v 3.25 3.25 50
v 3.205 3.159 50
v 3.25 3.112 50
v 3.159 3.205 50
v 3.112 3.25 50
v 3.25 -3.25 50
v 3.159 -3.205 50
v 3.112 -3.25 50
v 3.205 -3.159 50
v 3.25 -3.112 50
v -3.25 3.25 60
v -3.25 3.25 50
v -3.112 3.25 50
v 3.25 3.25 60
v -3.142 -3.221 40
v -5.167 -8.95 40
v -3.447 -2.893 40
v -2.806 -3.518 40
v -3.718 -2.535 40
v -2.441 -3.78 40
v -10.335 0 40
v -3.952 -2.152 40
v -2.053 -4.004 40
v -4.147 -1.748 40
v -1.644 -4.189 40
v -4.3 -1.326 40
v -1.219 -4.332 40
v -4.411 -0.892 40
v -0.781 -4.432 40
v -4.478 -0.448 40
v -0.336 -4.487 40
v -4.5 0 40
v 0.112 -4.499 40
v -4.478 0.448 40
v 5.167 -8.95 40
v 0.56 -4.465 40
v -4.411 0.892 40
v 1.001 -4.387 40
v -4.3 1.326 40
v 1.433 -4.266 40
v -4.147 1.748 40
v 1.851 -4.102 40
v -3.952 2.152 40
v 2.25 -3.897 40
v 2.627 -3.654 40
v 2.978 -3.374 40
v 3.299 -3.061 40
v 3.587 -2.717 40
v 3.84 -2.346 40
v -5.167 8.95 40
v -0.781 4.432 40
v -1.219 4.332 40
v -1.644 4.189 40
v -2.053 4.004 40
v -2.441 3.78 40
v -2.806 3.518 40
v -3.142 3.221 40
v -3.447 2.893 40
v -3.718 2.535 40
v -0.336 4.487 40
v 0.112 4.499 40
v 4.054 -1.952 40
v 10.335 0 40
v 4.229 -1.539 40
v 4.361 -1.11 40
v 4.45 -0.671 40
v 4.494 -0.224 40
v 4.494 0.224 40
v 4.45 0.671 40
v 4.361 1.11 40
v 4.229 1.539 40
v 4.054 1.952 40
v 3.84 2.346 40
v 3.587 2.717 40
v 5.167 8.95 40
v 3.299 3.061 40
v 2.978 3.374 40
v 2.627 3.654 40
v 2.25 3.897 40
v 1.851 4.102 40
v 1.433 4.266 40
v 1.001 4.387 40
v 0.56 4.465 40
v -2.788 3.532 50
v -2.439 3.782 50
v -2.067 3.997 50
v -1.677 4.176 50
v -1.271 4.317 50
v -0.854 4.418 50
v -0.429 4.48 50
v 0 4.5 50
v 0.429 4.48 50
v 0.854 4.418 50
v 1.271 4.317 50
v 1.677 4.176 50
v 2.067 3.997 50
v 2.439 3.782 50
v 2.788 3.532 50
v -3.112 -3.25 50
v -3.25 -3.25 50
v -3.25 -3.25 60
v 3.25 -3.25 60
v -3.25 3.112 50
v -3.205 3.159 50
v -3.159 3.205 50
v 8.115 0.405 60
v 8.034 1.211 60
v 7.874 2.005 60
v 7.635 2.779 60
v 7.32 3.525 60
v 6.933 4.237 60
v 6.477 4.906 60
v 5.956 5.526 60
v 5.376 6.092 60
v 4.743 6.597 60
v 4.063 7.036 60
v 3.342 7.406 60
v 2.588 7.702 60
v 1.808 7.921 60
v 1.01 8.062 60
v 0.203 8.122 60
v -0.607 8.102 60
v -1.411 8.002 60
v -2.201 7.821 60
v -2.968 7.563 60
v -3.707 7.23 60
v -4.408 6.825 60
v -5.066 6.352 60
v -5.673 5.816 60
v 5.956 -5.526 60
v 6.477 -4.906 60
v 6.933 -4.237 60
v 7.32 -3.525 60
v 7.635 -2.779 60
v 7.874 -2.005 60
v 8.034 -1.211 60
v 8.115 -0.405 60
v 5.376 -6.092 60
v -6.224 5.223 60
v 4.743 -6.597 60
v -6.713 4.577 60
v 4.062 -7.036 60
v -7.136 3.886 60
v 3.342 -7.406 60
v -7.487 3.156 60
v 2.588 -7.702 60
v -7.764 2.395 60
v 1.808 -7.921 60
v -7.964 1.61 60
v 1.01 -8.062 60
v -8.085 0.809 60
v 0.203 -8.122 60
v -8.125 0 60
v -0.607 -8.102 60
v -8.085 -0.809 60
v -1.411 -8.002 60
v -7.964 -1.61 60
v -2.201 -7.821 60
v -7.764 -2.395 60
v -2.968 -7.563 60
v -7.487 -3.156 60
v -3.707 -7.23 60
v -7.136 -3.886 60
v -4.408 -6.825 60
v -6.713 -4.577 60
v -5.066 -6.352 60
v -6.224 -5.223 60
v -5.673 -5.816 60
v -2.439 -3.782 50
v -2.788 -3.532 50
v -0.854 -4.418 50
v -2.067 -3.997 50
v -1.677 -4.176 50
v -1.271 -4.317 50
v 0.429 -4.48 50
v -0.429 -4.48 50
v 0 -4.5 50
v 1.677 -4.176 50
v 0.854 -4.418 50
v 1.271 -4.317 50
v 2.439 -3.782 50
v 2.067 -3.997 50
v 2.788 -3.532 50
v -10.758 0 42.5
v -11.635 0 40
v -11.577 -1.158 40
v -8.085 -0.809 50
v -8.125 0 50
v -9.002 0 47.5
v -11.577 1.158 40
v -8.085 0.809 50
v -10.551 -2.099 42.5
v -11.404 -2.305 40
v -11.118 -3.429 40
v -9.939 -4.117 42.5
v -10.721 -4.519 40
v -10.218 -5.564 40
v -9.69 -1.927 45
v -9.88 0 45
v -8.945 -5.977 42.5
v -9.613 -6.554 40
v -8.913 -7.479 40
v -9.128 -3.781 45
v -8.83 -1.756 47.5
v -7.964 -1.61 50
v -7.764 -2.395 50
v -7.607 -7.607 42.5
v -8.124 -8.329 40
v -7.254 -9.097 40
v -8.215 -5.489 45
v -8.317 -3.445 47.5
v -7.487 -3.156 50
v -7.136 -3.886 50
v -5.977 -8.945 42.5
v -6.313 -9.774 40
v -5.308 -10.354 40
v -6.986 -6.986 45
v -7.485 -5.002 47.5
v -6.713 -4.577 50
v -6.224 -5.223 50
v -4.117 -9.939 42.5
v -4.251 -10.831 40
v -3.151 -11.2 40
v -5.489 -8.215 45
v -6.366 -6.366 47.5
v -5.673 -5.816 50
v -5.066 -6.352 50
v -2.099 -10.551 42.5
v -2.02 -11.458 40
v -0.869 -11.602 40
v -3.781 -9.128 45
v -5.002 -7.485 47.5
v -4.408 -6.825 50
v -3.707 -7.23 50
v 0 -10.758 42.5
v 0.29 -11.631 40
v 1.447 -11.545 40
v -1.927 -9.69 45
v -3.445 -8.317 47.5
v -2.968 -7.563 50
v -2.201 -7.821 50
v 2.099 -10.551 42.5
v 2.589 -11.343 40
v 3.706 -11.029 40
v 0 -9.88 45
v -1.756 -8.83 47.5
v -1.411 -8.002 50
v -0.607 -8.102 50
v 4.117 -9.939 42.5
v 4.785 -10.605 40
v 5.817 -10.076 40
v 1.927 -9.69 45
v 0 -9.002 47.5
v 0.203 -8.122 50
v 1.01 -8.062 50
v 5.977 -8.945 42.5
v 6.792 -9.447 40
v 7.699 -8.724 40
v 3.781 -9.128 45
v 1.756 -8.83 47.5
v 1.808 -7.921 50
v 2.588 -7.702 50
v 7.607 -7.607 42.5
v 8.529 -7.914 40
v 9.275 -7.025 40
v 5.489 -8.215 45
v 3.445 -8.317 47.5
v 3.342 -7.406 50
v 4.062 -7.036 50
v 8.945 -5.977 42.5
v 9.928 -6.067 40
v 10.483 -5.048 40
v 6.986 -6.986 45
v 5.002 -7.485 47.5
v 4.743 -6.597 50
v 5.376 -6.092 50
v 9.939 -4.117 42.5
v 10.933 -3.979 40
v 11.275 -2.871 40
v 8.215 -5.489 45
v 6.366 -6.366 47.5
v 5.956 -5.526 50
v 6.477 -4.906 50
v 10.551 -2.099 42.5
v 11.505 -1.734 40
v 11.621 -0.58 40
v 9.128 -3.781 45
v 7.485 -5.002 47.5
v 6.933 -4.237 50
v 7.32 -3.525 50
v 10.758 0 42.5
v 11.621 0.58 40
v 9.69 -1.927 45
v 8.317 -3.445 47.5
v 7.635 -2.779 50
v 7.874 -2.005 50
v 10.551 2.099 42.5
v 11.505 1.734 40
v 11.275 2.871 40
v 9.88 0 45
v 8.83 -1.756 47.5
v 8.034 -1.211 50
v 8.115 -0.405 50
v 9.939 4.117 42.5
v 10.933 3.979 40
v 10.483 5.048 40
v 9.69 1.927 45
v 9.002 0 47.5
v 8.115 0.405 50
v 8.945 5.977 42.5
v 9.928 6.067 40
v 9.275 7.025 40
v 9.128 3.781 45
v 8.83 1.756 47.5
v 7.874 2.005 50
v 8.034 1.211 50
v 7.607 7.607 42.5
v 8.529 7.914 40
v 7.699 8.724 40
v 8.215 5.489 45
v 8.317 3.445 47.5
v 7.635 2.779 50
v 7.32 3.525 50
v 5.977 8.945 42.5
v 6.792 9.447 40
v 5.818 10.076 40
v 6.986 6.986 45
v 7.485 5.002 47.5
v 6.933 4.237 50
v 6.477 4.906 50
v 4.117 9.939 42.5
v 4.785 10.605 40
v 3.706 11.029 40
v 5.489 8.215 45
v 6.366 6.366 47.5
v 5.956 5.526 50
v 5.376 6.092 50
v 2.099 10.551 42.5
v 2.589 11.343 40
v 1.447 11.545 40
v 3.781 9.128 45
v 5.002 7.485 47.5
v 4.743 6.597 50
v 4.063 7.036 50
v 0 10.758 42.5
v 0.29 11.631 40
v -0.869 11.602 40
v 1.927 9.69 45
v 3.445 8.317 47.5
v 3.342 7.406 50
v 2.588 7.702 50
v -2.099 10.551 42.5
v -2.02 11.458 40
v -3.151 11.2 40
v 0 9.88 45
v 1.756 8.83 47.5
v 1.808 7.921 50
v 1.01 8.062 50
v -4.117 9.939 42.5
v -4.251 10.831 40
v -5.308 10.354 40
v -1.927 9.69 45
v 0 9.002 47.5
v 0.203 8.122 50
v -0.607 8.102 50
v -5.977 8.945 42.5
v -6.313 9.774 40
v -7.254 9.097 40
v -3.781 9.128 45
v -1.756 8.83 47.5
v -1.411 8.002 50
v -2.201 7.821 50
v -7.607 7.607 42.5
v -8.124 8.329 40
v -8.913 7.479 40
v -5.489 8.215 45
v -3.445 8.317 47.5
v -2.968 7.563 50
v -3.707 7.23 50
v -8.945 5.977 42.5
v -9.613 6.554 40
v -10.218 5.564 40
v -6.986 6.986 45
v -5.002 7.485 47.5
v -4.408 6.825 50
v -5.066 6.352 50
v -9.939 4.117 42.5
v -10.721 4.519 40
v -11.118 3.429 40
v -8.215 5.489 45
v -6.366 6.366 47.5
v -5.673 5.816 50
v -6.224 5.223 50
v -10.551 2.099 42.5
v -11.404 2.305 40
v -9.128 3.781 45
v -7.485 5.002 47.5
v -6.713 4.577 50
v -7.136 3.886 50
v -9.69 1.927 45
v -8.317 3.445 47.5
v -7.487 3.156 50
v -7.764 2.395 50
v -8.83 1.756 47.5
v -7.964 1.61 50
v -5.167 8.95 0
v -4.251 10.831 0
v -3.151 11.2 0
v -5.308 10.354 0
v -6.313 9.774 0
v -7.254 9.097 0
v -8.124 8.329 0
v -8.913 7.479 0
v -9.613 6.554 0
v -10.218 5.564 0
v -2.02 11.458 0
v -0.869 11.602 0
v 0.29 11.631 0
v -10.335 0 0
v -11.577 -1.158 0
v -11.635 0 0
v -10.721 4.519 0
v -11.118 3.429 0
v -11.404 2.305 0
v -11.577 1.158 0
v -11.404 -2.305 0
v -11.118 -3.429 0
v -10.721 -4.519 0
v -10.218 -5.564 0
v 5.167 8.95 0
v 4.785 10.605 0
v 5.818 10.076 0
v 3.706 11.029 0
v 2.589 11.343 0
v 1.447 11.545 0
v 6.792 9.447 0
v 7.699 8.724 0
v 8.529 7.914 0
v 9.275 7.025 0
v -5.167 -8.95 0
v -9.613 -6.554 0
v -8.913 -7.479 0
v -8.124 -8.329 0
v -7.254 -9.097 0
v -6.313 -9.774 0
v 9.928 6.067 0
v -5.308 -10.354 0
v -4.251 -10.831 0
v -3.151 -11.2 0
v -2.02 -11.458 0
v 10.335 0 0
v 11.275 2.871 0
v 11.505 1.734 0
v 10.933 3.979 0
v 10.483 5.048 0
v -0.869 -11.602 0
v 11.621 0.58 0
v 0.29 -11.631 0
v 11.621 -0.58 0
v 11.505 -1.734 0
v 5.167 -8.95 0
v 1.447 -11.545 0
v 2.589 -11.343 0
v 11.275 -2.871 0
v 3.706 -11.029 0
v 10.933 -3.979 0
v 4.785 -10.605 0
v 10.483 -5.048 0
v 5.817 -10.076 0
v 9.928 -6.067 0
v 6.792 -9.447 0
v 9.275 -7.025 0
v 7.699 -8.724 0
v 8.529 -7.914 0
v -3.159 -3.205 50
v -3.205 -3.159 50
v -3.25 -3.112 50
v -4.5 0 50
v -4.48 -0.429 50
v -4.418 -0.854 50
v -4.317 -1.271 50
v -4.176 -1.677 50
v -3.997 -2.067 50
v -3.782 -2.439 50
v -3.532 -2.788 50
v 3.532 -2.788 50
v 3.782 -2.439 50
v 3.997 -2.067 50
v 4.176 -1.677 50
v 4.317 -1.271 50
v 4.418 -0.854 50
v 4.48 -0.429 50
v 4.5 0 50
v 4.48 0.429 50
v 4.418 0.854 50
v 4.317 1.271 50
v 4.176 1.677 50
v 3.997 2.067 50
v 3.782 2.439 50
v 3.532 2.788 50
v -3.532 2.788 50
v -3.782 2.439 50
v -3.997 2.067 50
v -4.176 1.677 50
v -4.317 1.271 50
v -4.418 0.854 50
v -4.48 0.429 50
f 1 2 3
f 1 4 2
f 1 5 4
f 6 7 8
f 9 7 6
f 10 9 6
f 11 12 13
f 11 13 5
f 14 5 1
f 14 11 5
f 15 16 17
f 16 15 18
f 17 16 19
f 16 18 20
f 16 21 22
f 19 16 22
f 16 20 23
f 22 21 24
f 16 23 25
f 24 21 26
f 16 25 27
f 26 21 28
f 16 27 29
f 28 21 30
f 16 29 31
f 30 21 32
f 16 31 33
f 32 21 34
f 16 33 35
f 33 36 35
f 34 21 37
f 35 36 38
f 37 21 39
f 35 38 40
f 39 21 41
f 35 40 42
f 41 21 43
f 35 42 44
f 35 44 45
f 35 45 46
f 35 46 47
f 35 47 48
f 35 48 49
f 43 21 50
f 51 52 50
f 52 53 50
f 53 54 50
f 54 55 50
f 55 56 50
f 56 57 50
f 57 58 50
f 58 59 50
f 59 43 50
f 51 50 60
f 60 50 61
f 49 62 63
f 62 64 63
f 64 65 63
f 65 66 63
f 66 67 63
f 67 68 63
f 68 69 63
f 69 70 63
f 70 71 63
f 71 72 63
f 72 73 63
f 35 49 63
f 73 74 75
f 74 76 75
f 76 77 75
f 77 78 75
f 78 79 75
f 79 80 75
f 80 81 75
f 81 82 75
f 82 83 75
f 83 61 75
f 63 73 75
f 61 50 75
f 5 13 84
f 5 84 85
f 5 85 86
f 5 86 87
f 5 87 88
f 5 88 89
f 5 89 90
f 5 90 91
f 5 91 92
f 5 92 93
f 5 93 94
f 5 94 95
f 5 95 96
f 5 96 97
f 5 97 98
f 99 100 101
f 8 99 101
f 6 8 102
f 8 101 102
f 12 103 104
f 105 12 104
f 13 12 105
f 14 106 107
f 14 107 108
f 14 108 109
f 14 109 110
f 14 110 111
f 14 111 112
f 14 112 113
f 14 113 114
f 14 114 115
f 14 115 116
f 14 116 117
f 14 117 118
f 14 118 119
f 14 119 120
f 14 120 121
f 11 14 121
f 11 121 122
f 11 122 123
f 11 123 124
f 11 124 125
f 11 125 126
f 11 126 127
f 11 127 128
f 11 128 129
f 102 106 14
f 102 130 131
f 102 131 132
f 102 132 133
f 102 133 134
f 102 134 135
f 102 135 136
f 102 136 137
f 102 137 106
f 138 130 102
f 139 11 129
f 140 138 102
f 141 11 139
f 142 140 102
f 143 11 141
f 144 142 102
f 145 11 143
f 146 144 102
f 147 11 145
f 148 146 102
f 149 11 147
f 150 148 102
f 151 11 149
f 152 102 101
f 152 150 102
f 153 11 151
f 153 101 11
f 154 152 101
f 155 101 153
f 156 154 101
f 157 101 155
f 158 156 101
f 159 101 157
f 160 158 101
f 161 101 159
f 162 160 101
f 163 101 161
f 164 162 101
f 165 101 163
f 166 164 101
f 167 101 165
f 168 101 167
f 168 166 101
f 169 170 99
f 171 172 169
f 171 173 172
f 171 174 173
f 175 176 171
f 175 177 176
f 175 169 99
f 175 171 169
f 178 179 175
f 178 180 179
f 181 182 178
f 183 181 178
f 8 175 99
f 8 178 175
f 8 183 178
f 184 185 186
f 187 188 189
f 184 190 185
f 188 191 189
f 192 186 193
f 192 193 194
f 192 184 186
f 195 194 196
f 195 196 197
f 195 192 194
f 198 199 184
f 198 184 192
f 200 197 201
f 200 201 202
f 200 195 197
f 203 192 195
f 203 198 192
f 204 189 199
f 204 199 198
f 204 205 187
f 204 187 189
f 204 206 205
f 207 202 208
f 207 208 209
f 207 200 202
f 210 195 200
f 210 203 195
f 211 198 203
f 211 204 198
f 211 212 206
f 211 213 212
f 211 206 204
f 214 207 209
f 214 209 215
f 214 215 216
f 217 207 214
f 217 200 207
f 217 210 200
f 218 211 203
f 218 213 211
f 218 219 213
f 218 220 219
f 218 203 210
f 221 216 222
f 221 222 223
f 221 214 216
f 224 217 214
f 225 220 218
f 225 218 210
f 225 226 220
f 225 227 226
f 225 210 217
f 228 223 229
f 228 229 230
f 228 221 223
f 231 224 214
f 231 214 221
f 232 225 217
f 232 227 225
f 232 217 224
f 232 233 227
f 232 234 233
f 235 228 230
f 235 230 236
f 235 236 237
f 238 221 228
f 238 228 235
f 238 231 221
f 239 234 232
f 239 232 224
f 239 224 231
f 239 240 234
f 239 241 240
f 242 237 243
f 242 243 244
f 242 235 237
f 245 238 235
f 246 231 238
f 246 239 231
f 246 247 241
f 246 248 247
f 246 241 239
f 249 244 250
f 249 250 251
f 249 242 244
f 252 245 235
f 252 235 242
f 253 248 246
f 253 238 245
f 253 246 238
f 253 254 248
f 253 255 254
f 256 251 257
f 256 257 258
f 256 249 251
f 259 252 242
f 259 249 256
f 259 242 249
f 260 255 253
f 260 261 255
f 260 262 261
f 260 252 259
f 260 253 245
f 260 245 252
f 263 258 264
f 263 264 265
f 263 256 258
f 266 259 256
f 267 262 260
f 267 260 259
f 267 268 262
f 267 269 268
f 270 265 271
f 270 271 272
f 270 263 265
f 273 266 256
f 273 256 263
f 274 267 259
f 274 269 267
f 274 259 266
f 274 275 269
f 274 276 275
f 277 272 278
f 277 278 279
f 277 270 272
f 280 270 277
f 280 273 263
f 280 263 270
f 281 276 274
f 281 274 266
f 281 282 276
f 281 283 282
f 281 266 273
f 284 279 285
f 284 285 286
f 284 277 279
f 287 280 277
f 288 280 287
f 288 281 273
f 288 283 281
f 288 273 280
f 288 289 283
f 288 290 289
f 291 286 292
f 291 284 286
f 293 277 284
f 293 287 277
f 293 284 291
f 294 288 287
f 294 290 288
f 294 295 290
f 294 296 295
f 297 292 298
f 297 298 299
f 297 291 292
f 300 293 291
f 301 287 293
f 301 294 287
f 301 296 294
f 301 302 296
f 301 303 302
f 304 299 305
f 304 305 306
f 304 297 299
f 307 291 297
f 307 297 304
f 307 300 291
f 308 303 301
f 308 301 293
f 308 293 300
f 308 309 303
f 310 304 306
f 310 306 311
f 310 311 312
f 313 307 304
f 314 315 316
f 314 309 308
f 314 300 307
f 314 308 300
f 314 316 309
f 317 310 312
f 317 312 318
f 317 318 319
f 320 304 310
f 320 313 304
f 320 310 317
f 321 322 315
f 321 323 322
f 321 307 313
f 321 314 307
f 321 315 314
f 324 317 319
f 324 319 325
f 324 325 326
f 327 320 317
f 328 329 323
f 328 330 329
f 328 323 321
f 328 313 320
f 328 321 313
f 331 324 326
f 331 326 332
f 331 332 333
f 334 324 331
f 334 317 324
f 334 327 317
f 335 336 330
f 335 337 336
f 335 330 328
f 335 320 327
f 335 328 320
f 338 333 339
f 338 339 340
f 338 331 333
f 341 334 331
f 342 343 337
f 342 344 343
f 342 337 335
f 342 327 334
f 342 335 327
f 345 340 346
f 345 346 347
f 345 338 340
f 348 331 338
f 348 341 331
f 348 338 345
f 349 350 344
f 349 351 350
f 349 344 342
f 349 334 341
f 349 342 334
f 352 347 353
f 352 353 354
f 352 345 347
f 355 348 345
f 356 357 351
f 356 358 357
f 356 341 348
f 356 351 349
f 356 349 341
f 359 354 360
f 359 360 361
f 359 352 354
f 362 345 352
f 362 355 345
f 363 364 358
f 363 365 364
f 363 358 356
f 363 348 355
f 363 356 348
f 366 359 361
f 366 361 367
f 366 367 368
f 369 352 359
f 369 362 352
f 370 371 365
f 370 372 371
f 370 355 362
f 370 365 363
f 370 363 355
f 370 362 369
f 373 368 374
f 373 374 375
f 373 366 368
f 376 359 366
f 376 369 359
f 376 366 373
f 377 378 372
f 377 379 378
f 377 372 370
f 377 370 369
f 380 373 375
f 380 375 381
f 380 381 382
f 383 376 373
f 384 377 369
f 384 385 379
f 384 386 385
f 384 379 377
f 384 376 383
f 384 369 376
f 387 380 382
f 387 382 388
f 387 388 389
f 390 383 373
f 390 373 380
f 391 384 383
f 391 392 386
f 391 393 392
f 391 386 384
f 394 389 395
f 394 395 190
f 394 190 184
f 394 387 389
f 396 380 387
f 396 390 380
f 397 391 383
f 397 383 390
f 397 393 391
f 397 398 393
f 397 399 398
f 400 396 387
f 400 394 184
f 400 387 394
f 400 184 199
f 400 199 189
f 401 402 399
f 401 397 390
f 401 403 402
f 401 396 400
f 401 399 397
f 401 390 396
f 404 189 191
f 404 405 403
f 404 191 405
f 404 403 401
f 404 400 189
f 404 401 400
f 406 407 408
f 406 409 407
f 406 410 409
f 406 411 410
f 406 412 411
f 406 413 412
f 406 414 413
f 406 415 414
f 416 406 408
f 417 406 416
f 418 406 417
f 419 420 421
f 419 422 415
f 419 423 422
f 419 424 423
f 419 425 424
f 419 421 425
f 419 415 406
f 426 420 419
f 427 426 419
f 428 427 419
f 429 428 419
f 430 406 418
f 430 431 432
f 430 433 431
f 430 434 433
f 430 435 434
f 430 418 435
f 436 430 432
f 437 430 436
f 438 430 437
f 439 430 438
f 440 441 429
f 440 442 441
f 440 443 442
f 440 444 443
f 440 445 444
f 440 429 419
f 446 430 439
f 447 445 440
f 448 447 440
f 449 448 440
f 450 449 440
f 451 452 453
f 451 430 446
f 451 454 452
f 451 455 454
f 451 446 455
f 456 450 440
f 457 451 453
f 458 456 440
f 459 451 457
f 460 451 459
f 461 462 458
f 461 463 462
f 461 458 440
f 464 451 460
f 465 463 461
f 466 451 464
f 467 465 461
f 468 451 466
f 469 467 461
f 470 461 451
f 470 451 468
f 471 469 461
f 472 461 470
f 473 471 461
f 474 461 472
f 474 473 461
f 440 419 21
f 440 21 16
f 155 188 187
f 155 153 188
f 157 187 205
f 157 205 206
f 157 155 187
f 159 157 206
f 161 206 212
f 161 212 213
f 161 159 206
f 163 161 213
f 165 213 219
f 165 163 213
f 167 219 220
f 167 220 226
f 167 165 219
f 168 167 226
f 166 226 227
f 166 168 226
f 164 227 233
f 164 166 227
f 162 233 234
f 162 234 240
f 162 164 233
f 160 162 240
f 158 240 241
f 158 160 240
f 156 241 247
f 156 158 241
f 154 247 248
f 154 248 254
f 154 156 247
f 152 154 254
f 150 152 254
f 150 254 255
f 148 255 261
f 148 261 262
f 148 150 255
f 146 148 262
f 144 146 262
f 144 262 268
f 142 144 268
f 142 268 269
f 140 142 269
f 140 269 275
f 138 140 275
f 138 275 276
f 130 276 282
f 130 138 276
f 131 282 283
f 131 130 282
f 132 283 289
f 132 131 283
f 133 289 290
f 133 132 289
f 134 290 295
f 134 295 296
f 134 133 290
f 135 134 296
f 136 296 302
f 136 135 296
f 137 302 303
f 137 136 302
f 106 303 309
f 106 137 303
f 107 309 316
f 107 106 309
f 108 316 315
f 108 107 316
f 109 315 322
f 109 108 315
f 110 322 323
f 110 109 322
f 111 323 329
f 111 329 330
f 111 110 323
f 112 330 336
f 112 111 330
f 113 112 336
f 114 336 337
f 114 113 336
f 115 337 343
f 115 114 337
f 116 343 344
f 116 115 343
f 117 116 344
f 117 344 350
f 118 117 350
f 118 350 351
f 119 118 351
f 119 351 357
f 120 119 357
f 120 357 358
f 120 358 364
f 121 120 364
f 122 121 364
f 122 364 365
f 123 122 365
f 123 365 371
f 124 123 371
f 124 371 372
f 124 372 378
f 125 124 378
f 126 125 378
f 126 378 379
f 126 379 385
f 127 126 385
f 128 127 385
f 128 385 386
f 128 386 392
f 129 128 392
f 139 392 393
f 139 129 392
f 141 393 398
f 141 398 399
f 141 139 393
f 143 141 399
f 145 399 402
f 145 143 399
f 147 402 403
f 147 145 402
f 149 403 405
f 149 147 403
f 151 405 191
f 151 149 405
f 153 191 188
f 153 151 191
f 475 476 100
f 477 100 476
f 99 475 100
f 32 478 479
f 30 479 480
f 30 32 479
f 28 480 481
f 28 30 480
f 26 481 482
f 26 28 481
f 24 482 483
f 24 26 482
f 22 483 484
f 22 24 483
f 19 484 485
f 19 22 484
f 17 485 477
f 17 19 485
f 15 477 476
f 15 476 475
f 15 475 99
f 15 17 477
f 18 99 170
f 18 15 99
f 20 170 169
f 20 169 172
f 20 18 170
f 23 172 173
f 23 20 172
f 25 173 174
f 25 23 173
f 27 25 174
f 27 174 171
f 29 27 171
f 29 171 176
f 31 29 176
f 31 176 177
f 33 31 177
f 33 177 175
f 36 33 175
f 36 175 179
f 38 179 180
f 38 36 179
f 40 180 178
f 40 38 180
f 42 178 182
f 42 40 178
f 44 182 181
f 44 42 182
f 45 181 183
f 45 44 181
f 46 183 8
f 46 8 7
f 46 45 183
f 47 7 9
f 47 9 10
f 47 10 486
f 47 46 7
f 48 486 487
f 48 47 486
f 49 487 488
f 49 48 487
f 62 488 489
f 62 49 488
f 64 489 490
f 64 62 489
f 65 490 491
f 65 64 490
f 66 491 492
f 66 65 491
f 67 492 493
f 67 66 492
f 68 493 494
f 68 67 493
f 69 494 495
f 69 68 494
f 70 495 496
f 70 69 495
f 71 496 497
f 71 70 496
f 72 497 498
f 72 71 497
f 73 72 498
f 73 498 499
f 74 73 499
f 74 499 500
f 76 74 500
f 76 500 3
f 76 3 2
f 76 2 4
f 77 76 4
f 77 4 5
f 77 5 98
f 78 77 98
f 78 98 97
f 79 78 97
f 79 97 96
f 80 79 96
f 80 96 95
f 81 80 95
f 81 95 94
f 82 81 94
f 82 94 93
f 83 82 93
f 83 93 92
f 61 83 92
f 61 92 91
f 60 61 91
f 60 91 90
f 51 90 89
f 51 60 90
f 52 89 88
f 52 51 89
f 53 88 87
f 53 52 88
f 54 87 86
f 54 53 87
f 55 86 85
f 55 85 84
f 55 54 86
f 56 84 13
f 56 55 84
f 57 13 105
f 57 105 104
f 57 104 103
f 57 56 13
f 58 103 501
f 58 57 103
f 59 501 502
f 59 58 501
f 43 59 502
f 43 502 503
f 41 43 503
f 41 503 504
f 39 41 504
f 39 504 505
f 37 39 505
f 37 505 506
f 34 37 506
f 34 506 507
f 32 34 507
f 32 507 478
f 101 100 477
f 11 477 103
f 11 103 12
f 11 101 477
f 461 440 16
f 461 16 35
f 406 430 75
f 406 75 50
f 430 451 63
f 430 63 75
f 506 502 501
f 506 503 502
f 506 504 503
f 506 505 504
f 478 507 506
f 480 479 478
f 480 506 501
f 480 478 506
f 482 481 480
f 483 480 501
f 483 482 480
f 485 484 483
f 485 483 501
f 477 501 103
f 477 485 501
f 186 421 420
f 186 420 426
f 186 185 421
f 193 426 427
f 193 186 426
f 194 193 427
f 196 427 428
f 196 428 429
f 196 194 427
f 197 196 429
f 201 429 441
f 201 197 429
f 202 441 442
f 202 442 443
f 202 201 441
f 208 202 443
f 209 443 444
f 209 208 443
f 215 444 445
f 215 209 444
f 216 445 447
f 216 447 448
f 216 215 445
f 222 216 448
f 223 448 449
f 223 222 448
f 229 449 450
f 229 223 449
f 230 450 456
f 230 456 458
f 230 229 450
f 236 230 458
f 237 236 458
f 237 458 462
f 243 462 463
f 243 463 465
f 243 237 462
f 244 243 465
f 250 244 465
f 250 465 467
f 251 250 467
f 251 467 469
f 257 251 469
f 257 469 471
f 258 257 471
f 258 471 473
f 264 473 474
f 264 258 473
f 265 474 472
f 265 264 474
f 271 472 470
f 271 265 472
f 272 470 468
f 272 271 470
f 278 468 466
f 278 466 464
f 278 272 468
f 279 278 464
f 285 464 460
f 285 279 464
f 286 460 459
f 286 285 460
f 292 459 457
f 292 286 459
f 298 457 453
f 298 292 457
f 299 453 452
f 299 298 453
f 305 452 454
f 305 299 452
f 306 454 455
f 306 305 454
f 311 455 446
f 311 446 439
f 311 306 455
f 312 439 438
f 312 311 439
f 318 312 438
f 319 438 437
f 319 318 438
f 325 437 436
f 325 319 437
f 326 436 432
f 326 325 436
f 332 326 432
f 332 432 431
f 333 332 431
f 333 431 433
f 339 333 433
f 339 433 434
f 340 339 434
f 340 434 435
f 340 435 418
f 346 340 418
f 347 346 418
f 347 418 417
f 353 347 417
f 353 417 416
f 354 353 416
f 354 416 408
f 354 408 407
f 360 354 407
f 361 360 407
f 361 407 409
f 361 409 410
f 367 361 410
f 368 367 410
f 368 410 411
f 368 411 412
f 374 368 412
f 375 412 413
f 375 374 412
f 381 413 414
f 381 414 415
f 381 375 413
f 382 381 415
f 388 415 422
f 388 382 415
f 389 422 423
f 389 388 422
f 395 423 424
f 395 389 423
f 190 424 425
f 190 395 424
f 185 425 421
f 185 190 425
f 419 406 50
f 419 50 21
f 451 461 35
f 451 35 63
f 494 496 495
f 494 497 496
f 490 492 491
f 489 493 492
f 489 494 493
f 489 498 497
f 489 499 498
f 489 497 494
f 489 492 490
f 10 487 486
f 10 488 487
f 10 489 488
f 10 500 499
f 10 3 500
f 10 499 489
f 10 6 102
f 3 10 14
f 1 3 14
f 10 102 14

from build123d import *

# Parameters (mm, degrees)
SKETCH001_W     = 6.5
SKETCH001_H     = 6.5
POCKET_DEPTH    = 10
POCKET001_DEPTH = 40


with BuildPart() as part:
    # Sketch → Revolution (revolve)
    with BuildSketch(Plane.XZ):
        Polygon((0, 0), (-11.635, 0), (-11.635, 40), (-8.125, 50), (-8.125, 60), (0, 60), (0, 50), (-4.5, 50), (-4.5, 40), (0, 40), align=None)
    revolve(axis=Axis((0, 0, 0), (0, 0, 1)))

    # Sketch001 (on DatumPlane) → Pocket (cut)
    with BuildSketch(Plane.XY.offset(60)):
        Rectangle(SKETCH001_W, SKETCH001_H)
    extrude(amount=-POCKET_DEPTH, mode=Mode.SUBTRACT)

    # Sketch002 → Pocket001 (cut)
    with BuildSketch(Plane.XY):
        Polygon((10.33457, 0), (5.167285, 8.95), (-5.167285, 8.95), (-10.33457, 0), (-5.167285, -8.95), (5.167285, -8.95), align=None)
    extrude(amount=POCKET001_DEPTH, mode=Mode.SUBTRACT)


solid = part.part
